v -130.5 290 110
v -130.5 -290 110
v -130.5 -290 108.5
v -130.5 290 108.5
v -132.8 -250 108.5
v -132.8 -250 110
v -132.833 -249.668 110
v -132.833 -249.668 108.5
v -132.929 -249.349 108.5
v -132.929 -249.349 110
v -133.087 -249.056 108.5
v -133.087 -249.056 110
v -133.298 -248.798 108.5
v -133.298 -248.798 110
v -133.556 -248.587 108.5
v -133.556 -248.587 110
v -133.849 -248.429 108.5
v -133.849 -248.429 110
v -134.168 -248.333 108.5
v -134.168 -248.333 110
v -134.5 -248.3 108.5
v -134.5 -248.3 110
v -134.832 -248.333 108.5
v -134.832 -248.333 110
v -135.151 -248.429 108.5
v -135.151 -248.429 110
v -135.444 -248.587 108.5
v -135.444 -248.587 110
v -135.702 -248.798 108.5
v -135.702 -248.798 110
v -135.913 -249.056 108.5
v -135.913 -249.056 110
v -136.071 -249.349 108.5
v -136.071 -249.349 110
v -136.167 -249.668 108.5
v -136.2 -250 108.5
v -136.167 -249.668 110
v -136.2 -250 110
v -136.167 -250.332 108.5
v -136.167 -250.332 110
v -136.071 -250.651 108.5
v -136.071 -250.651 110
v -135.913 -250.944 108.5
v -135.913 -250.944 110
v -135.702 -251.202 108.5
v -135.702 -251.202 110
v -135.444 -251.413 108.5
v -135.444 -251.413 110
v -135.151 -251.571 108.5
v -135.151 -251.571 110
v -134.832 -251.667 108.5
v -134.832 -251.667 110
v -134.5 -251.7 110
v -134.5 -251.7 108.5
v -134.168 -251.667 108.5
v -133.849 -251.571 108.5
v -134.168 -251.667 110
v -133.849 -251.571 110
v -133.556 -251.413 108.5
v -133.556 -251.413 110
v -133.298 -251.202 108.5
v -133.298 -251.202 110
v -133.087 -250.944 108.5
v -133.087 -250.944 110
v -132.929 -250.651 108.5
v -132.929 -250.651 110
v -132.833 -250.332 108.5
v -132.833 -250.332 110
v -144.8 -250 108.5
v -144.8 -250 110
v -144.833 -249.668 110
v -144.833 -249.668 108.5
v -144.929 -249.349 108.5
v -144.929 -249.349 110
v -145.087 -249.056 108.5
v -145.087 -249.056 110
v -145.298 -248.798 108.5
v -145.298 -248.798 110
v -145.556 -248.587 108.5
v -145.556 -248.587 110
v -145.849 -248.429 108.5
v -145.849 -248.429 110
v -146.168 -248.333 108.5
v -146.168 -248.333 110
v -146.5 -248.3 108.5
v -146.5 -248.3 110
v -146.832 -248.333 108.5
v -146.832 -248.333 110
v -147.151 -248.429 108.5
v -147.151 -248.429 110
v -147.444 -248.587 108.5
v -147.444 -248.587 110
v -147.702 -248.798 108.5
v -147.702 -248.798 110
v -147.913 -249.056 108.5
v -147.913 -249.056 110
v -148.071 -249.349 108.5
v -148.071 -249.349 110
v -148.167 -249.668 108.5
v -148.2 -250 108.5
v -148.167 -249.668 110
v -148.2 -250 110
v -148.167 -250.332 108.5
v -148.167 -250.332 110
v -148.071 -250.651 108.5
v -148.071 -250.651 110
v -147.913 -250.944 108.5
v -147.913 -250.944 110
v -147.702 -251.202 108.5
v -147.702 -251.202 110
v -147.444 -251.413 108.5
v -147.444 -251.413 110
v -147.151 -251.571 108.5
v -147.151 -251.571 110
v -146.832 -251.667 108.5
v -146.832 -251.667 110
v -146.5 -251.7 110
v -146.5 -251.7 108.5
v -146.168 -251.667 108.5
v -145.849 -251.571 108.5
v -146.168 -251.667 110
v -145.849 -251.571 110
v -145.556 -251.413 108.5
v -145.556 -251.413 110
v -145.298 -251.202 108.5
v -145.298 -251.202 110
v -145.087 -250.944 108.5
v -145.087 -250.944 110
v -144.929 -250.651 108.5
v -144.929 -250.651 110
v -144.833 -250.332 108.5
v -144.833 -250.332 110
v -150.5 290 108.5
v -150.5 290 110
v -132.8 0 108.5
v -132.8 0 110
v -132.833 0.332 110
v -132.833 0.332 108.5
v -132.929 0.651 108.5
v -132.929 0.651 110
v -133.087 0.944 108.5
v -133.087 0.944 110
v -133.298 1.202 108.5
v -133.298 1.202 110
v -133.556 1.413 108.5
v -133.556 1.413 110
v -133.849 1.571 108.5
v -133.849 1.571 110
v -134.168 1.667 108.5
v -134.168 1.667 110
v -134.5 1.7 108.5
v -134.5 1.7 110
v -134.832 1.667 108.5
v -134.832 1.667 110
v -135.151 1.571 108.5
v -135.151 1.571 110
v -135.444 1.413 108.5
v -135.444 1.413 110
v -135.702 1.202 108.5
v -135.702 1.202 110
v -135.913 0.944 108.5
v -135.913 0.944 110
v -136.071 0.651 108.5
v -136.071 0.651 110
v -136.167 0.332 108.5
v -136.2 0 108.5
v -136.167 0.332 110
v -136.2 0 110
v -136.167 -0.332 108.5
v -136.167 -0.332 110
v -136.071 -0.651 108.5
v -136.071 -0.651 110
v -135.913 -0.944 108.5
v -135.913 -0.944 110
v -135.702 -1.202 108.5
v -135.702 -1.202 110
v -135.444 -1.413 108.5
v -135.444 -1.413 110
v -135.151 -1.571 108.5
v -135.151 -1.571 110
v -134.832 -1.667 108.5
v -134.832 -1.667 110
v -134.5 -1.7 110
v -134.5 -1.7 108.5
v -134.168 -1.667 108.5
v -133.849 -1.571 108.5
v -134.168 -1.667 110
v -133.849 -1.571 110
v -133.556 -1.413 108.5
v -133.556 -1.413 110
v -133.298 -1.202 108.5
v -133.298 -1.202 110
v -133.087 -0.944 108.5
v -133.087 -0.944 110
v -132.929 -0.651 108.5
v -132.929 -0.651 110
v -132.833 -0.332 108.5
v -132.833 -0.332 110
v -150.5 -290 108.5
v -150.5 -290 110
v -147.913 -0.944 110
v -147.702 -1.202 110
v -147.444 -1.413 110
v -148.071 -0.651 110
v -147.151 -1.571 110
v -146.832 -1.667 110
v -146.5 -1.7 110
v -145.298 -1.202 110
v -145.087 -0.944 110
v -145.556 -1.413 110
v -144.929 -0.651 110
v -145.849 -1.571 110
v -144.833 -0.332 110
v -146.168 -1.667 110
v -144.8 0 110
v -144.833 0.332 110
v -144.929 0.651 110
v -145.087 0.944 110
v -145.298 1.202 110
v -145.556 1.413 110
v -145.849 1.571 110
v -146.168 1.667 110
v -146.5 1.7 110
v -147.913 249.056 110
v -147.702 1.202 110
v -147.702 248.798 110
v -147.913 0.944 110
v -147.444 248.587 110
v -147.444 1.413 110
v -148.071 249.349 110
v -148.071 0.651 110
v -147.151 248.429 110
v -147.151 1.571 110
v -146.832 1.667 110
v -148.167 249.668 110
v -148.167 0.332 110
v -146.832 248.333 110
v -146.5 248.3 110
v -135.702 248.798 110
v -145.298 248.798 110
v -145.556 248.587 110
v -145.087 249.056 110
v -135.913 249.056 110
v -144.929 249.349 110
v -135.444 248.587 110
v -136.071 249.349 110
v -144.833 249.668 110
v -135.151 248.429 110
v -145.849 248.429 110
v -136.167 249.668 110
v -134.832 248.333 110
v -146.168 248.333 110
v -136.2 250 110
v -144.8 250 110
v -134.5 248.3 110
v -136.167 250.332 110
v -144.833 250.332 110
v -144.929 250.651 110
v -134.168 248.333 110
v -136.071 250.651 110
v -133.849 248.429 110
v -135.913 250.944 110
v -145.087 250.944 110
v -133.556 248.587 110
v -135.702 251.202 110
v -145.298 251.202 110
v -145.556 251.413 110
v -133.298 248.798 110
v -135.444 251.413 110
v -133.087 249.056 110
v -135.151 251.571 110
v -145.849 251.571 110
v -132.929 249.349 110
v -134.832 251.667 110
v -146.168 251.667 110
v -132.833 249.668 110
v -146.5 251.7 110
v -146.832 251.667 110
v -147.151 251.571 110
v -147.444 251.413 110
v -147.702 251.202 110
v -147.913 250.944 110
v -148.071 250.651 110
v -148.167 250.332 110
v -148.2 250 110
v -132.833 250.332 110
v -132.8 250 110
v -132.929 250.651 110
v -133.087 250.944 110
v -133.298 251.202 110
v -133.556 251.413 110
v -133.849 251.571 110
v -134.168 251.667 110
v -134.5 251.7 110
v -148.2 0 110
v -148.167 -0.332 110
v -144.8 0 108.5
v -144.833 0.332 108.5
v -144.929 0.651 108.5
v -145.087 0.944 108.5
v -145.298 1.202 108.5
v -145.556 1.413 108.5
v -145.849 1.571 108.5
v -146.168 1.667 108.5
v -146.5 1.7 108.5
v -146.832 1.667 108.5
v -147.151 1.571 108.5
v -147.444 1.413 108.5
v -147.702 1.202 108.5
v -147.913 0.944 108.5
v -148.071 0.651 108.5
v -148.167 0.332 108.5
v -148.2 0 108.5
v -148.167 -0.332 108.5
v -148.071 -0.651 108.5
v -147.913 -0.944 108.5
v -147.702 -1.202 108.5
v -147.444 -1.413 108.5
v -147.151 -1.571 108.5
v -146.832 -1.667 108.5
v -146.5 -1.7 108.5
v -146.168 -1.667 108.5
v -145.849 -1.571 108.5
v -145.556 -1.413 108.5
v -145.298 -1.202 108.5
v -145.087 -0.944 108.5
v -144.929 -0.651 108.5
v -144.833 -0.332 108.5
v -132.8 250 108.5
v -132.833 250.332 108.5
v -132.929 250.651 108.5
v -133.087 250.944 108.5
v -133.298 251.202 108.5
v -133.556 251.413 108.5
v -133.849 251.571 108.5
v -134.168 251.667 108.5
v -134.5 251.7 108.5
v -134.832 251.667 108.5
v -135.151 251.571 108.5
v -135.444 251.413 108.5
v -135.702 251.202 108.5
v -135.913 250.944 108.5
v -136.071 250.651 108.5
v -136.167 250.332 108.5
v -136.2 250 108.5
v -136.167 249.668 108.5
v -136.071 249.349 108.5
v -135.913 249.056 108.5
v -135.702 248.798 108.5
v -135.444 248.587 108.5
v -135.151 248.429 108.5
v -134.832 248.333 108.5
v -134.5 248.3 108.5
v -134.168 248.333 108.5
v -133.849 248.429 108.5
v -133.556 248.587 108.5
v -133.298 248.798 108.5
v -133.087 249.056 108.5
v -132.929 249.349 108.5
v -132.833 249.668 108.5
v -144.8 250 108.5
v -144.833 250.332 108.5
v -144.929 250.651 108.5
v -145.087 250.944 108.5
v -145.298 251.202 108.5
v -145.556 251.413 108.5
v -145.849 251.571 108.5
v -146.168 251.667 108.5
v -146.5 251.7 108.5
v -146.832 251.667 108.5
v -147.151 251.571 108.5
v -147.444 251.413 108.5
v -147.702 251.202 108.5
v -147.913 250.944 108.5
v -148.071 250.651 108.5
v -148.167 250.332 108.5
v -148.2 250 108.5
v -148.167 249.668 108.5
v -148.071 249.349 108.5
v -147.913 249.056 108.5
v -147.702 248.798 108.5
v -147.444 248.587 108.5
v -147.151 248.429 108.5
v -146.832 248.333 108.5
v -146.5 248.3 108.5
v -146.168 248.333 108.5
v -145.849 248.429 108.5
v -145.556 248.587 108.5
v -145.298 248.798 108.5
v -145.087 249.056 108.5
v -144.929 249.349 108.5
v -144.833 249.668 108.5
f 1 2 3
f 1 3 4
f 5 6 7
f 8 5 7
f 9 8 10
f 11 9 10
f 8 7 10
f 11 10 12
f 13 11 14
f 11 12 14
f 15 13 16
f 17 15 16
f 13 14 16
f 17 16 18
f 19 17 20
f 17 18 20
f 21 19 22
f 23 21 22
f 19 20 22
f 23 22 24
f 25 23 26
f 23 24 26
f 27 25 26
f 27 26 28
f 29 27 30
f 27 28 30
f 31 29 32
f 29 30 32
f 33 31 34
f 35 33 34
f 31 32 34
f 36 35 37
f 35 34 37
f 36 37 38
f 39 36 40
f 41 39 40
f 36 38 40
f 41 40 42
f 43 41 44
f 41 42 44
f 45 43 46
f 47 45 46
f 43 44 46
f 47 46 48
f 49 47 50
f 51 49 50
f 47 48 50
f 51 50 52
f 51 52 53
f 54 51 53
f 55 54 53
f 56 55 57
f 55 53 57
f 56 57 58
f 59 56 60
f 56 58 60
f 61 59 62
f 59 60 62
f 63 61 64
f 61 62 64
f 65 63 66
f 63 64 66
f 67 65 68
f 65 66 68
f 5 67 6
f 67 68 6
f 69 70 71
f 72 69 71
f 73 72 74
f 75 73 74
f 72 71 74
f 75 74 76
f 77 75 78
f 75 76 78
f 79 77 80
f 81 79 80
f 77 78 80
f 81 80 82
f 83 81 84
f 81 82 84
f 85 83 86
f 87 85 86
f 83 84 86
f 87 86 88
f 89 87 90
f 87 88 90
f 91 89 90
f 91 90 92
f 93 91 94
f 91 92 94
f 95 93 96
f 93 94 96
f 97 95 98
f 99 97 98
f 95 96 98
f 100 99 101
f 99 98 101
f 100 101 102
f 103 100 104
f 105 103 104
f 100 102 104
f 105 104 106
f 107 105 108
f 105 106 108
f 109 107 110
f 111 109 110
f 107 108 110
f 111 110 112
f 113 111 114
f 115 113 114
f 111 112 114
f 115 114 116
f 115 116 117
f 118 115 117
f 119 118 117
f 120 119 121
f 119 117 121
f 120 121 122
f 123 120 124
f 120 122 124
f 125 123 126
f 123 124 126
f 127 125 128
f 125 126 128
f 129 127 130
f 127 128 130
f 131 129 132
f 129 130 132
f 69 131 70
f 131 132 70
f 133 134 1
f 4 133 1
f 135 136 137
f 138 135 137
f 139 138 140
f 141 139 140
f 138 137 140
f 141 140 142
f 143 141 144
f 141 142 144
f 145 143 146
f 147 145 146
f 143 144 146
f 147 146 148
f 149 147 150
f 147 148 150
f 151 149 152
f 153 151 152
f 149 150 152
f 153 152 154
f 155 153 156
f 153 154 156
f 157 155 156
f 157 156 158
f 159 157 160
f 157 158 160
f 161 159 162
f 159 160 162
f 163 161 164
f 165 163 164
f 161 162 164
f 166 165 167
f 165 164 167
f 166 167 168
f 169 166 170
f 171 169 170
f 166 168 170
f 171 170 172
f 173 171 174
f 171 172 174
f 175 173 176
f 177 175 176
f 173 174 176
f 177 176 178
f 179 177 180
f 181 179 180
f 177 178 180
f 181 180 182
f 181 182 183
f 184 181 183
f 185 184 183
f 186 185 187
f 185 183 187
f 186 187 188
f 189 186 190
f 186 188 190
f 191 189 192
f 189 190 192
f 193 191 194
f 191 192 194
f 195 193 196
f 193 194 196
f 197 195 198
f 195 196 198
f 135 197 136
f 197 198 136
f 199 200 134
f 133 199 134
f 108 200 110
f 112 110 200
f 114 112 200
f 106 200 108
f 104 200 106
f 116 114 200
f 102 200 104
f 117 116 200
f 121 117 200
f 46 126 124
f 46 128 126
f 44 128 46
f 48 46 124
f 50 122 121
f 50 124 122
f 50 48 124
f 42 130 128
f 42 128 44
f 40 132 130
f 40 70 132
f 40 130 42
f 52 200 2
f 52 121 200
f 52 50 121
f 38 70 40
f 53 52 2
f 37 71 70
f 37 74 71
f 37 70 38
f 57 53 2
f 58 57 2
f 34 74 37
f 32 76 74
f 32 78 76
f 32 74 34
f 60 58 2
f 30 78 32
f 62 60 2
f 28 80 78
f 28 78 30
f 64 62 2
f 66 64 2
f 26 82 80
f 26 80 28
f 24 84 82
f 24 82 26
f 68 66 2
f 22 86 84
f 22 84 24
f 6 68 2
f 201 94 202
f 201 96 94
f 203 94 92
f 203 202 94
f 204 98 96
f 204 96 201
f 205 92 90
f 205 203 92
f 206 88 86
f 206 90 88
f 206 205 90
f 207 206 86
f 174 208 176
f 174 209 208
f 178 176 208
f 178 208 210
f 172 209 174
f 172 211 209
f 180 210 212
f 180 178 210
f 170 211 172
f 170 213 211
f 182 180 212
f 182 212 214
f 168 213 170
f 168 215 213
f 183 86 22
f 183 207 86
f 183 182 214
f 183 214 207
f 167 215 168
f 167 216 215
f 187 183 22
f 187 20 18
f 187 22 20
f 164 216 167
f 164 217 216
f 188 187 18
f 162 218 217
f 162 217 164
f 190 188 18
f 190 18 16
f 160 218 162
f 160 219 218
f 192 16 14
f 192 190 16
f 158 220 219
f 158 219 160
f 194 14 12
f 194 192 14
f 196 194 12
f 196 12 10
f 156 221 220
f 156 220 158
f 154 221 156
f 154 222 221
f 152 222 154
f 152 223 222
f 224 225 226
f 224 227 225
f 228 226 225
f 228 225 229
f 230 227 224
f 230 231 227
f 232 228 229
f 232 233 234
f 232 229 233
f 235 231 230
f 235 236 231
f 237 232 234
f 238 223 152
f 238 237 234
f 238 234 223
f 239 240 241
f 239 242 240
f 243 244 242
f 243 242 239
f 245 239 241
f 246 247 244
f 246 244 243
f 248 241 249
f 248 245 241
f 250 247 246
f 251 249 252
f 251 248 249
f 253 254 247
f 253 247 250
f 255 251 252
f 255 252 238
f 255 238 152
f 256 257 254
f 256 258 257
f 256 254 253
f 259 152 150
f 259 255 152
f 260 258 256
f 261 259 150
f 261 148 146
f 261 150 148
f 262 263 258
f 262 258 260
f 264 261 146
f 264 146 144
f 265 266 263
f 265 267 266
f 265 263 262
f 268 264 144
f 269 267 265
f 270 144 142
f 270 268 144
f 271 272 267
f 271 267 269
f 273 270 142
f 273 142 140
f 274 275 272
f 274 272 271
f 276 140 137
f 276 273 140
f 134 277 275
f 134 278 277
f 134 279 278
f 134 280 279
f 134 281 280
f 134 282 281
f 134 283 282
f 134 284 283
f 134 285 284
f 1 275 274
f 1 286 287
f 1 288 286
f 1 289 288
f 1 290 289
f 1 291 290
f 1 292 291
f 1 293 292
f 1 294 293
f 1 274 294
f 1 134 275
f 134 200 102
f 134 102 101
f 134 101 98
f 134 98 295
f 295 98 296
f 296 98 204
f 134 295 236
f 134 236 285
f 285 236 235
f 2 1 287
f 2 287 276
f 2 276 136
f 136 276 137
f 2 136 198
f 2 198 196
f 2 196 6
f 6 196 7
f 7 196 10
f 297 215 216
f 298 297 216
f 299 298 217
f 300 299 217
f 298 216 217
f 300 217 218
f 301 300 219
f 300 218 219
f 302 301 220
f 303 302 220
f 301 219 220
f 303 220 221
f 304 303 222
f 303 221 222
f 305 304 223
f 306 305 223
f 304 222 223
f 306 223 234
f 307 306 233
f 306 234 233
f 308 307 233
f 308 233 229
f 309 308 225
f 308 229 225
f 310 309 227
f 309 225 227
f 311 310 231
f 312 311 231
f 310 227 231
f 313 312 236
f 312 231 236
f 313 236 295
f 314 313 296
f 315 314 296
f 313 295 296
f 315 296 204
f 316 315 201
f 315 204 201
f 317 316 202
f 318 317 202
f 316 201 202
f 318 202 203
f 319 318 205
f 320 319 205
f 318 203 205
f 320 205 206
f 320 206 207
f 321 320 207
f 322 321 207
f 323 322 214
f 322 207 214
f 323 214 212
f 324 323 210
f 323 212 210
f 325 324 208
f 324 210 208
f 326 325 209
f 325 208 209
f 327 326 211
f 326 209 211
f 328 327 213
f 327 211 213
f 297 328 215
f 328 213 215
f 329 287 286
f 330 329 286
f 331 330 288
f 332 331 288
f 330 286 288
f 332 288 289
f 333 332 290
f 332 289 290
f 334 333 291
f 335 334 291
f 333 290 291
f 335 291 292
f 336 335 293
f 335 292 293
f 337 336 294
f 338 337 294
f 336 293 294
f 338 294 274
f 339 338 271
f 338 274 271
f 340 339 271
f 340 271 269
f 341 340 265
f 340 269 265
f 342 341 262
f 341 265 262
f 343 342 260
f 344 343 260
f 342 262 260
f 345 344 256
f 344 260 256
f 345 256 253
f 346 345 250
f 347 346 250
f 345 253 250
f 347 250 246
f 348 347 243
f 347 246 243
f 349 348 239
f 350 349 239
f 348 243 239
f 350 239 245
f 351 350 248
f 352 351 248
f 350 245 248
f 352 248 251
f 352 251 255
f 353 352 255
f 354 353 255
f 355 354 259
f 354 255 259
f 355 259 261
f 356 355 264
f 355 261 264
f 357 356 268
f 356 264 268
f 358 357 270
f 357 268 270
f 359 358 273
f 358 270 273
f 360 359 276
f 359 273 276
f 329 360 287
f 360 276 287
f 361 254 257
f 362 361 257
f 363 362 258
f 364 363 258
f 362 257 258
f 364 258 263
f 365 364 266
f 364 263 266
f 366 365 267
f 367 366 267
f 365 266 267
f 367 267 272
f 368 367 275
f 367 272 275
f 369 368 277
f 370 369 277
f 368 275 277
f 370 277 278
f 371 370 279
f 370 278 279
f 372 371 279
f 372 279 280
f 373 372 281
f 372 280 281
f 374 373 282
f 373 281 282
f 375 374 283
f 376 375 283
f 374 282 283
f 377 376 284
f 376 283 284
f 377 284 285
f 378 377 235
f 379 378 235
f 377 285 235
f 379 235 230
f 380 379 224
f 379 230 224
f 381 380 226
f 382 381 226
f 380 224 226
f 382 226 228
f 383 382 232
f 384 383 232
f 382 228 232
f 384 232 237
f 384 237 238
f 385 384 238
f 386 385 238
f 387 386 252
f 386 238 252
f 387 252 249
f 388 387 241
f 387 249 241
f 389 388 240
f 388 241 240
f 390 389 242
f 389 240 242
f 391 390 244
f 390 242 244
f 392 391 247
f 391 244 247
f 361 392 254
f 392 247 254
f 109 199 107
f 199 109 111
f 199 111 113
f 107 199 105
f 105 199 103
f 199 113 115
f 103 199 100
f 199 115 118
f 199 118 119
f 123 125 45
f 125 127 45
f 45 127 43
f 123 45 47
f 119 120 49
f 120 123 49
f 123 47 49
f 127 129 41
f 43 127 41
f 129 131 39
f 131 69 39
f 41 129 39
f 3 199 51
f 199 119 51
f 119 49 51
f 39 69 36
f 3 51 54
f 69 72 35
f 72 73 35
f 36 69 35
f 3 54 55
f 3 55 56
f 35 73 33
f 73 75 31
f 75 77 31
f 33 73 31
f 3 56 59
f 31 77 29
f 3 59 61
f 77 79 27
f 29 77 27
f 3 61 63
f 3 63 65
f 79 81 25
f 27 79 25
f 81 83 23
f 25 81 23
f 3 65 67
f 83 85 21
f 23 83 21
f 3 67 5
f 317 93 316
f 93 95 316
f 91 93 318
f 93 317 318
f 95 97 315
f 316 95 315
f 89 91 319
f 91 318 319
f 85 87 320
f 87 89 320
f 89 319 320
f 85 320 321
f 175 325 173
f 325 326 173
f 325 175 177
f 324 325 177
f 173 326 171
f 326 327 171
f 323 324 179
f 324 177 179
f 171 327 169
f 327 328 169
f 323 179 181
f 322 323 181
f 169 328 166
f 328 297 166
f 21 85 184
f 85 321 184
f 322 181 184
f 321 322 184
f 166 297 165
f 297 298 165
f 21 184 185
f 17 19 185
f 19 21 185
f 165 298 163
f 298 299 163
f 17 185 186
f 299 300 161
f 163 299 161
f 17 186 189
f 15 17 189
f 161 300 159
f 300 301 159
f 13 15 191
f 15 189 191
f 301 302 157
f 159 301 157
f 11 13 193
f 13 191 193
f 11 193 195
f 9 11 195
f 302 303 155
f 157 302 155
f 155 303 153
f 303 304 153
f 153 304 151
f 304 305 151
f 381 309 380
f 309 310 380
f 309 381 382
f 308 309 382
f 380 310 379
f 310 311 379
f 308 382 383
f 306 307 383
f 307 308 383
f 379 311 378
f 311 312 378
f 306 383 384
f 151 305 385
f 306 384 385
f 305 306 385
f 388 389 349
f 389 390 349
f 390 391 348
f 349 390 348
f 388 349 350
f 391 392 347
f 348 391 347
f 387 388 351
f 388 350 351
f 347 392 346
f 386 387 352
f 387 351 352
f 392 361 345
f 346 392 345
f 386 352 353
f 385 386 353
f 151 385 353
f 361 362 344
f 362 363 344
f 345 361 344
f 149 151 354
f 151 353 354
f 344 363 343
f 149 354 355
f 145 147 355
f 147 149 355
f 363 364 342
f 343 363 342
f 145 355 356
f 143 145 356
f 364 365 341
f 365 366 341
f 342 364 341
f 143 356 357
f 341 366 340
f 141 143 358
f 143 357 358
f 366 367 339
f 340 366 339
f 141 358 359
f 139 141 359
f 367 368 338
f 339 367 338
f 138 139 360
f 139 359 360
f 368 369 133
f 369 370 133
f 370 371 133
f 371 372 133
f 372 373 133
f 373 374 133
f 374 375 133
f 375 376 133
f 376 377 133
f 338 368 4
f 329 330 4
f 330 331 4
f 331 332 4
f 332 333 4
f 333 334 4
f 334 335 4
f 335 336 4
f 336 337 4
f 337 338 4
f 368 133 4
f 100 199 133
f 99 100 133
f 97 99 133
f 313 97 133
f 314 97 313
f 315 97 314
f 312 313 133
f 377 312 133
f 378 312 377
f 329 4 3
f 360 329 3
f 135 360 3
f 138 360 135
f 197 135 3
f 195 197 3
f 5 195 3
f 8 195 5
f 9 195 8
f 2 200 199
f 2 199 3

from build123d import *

# Parameters (mm, degrees)
MAIN_PROFILE_SKETCH_W = 20
MAIN_PROFILE_SKETCH_H = 580
MAIN_PROFILE_SKETCH_R = 1.7
MAIN_EXTRUSION_DEPTH  = 1.5


with BuildPart() as part:
    # Main Profile Sketch → Main Extrusion (new body)
    with BuildSketch(Plane.XY.offset(110)):
        with Locations((-140.5, 0)):
            Rectangle(MAIN_PROFILE_SKETCH_W, MAIN_PROFILE_SKETCH_H)
        with Locations((-146.5, -250)):
            Circle(MAIN_PROFILE_SKETCH_R, mode=Mode.SUBTRACT)
        with Locations((-134.5, -250)):
            Circle(MAIN_PROFILE_SKETCH_R, mode=Mode.SUBTRACT)
        with Locations((-146.5, 0)):
            Circle(MAIN_PROFILE_SKETCH_R, mode=Mode.SUBTRACT)
        with Locations((-146.5, 250)):
            Circle(MAIN_PROFILE_SKETCH_R, mode=Mode.SUBTRACT)
        with Locations((-134.5, 0)):
            Circle(MAIN_PROFILE_SKETCH_R, mode=Mode.SUBTRACT)
        with Locations((-134.5, 250)):
            Circle(MAIN_PROFILE_SKETCH_R, mode=Mode.SUBTRACT)
    extrude(amount=-MAIN_EXTRUSION_DEPTH)


solid = part.part
